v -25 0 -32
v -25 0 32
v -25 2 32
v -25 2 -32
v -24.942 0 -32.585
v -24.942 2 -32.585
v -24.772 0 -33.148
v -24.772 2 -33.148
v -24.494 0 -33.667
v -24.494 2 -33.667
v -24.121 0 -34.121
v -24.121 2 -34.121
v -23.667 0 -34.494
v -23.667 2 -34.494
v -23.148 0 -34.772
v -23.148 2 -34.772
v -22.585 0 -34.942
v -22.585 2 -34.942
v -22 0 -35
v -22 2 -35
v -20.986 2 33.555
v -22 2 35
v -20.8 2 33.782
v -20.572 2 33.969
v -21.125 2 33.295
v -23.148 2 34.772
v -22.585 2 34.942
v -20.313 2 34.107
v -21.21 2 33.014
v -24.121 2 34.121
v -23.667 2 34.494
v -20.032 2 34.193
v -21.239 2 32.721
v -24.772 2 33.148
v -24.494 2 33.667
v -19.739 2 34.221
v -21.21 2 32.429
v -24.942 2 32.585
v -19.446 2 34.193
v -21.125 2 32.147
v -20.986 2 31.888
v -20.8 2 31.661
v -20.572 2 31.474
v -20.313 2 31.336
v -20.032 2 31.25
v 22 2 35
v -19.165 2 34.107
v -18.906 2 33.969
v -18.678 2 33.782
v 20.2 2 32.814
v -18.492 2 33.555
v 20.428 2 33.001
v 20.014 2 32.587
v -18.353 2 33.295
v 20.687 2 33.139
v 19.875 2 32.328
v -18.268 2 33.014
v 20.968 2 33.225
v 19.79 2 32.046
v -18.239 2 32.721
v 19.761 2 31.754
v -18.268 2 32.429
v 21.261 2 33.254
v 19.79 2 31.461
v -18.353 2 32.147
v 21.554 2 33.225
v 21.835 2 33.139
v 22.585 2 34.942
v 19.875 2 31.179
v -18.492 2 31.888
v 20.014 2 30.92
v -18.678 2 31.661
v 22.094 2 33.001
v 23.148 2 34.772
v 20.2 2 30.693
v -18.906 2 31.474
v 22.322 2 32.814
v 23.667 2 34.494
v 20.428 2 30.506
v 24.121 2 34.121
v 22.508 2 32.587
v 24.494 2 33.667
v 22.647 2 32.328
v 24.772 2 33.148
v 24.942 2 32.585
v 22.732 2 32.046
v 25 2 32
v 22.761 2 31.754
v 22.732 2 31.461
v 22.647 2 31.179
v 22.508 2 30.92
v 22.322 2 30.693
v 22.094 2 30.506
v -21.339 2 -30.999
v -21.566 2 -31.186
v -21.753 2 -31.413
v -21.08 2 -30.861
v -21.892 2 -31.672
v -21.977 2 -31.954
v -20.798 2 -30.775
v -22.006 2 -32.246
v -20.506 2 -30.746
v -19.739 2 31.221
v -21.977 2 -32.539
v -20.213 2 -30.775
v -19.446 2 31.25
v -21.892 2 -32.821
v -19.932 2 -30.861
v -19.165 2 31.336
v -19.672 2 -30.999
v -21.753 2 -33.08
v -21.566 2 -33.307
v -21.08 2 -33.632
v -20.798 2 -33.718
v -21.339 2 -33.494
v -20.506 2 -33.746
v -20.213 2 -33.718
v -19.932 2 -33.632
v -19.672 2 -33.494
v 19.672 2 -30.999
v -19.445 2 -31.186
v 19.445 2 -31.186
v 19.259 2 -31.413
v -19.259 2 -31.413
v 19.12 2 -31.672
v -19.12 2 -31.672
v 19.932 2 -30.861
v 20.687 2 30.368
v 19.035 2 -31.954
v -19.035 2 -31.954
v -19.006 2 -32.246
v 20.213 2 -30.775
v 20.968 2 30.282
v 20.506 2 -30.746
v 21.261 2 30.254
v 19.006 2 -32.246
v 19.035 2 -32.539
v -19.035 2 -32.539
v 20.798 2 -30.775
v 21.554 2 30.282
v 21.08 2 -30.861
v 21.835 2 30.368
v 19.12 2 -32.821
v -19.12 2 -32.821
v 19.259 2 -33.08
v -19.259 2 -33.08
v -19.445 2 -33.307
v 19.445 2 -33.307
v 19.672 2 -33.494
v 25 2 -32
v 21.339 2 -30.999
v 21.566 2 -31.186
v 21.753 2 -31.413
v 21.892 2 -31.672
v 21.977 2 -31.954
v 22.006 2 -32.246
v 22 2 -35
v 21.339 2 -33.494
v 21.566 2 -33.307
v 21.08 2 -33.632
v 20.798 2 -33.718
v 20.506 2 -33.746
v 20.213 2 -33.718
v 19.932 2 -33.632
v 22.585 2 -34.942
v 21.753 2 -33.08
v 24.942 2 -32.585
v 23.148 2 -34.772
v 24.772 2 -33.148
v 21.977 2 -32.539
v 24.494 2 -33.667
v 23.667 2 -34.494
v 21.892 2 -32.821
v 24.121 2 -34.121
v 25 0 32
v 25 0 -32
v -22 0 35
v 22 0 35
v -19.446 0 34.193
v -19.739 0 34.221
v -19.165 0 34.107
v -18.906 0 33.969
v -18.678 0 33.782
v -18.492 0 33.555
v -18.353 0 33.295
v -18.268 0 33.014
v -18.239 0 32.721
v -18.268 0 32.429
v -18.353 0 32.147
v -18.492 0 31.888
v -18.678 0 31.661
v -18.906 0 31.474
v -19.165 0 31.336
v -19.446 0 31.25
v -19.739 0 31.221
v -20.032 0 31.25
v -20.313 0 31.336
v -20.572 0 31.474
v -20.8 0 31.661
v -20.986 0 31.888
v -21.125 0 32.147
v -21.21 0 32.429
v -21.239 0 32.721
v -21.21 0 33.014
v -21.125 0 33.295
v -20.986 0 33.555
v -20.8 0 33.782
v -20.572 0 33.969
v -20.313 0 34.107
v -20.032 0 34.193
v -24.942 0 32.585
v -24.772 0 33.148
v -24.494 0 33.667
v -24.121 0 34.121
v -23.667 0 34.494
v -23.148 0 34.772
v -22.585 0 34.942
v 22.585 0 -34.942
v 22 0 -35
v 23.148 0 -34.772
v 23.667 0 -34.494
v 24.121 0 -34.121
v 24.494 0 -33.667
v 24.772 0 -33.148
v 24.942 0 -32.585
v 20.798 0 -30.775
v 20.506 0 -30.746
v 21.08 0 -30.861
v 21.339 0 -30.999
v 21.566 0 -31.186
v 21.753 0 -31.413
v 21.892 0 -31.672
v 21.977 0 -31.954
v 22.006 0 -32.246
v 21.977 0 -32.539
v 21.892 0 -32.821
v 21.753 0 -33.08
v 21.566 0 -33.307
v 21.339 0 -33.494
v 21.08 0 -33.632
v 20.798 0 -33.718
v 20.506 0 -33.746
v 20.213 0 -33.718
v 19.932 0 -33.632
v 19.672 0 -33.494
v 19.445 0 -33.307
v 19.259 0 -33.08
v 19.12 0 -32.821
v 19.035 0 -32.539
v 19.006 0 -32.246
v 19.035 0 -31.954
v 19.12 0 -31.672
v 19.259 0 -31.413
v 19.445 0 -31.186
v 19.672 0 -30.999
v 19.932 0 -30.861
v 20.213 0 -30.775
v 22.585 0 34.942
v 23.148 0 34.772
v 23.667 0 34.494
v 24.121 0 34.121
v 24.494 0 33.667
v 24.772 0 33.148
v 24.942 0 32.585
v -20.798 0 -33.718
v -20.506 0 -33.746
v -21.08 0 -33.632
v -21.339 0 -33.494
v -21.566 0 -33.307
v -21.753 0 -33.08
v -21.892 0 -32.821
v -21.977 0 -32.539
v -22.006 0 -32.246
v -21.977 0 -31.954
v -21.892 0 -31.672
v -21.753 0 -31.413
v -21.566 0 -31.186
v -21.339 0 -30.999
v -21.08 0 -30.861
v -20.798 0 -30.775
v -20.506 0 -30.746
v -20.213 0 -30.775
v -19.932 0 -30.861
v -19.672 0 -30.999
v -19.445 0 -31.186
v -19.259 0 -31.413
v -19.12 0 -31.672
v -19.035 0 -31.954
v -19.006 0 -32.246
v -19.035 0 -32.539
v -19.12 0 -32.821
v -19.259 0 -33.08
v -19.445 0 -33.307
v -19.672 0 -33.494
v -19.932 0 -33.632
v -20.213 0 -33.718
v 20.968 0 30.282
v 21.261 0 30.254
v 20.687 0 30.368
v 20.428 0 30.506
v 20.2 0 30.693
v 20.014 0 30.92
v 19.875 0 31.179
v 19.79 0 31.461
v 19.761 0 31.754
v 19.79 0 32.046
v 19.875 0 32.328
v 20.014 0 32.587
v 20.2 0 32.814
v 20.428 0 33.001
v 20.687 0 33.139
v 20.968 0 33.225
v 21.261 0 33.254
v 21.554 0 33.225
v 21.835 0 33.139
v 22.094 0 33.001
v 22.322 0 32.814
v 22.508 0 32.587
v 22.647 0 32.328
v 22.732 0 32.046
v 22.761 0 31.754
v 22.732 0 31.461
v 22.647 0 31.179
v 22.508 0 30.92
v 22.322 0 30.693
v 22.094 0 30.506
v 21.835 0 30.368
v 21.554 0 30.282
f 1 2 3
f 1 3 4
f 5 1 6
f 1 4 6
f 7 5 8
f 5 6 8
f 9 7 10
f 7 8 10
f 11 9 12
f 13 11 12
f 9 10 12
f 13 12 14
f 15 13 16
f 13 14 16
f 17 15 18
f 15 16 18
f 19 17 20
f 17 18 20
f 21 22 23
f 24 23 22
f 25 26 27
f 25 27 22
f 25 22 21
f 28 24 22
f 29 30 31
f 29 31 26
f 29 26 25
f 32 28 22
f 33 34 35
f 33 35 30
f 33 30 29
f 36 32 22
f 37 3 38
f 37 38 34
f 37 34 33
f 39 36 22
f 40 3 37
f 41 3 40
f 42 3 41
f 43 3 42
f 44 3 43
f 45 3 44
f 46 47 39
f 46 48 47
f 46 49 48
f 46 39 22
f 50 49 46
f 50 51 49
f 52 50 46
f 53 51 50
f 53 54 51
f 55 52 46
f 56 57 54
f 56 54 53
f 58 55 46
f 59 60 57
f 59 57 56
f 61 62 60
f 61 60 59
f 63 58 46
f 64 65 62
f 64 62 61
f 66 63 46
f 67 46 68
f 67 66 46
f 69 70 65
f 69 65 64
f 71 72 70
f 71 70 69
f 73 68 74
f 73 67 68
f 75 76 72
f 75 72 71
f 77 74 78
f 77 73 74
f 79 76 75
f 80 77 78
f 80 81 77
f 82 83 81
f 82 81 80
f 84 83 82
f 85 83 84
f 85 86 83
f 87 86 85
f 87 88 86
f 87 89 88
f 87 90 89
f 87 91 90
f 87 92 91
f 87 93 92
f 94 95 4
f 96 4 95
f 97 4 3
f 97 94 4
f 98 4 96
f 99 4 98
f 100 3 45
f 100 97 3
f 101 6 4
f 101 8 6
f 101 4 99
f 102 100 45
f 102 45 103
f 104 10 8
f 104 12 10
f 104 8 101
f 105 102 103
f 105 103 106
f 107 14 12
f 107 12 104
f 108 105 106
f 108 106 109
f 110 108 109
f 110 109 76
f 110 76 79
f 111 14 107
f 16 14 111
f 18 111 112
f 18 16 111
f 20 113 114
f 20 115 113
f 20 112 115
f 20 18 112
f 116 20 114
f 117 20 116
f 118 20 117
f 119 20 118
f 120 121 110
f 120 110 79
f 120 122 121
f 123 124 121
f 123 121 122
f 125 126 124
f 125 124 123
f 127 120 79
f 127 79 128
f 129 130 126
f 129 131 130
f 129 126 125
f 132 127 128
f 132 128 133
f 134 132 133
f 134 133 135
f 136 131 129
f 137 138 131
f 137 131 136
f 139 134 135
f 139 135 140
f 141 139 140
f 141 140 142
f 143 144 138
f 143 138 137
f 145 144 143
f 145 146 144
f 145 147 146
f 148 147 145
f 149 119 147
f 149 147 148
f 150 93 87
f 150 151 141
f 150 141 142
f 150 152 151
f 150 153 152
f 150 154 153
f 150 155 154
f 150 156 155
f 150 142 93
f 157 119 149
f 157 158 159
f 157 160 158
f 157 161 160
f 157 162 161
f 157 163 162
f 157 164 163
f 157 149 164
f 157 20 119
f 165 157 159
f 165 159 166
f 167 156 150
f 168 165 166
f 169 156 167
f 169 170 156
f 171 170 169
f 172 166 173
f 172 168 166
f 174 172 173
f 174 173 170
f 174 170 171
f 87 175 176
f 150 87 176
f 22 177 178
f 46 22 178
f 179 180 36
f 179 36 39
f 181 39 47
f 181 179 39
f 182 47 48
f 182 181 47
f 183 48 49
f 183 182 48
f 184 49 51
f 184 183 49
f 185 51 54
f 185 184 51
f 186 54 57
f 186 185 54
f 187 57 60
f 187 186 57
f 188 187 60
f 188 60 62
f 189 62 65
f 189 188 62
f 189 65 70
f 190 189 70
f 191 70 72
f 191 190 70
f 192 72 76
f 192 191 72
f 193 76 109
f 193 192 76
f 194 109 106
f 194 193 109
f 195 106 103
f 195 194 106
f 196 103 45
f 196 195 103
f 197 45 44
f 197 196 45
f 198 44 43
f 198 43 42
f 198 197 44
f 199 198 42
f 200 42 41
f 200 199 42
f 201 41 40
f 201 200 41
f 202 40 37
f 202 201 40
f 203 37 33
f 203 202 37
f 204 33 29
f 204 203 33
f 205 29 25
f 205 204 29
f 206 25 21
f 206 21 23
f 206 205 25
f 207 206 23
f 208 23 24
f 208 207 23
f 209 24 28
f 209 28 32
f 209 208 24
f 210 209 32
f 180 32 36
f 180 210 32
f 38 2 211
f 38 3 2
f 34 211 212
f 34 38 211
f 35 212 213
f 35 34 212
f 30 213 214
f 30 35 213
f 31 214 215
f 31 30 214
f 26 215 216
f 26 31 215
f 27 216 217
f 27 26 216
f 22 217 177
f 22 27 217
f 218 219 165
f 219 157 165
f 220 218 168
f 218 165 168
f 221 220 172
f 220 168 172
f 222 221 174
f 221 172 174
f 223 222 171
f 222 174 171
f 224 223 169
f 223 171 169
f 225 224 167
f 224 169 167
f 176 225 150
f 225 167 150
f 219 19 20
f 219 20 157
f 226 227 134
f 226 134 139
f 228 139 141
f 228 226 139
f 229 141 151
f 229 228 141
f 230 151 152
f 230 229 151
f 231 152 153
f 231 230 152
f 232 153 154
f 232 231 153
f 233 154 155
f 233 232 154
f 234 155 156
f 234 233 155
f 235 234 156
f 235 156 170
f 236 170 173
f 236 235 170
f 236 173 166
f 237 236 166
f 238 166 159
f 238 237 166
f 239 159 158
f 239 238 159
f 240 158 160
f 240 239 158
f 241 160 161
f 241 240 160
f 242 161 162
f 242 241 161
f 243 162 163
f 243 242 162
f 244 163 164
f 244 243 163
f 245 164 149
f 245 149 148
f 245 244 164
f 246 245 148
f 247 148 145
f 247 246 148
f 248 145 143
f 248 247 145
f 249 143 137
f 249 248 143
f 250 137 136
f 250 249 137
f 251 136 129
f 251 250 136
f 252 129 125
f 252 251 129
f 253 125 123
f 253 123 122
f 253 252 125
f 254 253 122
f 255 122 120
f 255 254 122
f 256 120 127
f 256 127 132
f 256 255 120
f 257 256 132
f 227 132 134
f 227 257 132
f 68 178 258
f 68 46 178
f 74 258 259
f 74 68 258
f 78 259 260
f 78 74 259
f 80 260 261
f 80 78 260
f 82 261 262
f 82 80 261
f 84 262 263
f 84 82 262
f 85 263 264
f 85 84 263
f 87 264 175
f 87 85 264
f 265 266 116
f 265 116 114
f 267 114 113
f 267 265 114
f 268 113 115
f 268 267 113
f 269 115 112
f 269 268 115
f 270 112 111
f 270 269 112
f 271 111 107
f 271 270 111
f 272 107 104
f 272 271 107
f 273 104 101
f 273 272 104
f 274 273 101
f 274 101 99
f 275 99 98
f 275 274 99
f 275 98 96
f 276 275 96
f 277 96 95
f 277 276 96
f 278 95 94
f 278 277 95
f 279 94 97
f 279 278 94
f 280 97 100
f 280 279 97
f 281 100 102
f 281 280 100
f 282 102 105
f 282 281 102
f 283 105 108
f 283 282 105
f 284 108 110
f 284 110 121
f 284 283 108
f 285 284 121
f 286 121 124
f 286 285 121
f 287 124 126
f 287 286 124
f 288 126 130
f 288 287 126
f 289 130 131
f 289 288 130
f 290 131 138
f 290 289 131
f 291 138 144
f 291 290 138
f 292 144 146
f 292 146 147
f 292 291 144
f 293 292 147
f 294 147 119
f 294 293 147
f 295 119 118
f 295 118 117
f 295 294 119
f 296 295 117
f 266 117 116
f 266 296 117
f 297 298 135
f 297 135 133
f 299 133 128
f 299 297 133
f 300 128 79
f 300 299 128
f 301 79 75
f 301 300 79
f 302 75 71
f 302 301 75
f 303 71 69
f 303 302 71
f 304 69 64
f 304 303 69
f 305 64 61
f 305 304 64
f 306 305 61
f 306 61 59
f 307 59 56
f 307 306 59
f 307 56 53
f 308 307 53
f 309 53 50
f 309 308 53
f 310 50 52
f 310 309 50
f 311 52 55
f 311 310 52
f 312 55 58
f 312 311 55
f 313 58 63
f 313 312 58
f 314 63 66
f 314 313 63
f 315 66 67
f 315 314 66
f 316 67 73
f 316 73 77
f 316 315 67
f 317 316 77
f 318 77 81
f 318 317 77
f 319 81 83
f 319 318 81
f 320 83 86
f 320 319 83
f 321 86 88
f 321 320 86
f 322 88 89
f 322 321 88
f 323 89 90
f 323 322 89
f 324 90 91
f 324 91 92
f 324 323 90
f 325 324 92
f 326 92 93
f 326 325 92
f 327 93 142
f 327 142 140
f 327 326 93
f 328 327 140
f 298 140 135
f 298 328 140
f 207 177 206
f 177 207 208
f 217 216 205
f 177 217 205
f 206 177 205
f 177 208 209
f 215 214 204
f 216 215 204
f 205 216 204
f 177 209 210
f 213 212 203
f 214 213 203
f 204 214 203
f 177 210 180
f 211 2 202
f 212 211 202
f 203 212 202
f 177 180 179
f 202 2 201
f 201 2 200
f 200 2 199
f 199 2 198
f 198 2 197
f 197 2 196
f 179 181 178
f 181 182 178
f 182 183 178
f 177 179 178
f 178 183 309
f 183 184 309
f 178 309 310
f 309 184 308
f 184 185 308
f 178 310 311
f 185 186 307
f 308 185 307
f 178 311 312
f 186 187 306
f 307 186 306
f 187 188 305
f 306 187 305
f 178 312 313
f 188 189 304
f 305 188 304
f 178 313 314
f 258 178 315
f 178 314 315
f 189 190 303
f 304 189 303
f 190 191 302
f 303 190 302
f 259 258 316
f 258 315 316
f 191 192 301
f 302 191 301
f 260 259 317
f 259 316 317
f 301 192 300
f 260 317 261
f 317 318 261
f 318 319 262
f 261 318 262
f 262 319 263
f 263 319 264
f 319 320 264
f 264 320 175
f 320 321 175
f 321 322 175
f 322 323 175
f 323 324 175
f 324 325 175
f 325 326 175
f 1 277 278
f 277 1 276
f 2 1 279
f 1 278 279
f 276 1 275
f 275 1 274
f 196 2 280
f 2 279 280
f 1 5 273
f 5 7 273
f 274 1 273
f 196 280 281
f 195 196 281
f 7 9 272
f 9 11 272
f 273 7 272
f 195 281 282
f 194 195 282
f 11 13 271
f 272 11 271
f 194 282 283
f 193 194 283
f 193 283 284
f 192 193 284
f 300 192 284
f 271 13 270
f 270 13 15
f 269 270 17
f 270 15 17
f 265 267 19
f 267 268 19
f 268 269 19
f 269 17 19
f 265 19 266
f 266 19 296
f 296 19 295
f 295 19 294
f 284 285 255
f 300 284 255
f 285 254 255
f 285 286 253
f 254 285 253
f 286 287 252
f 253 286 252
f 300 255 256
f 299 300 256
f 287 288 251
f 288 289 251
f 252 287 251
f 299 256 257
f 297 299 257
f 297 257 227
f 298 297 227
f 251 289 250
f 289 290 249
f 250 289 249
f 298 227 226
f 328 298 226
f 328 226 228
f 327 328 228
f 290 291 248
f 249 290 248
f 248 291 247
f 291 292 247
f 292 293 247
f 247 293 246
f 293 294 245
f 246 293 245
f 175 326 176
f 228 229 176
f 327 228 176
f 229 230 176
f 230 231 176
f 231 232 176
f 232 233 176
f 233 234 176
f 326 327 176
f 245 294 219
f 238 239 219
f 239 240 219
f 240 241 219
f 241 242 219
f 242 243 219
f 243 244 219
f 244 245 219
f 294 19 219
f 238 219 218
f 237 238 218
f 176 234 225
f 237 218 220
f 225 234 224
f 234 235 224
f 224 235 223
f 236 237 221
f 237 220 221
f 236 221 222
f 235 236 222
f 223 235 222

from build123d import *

# Parameters (mm, degrees)
SKETCH_1_W      = 50
SKETCH_1_H      = 70
SKETCH_1_R      = 1.5
EXTRUDE_1_DEPTH = 2
FILLET_1_R      = 3


with BuildPart() as part:
    # 草图1 → 凸台-拉伸1 (new body)
    with BuildSketch(Plane(origin=(0, 0, 0), x_dir=(1, 0, 0), z_dir=(0, 1, 0))):
        Rectangle(SKETCH_1_W, SKETCH_1_H)
        with Locations(Location((20.505712162, 32.246478585, 0), (0, 0, 270))):
            Circle(SKETCH_1_R, mode=Mode.SUBTRACT)
        with Locations(Location((-20.505712162, 32.246478585, 0), (0, 0, 90))):
            Circle(SKETCH_1_R, mode=Mode.SUBTRACT)
        with Locations(Location((21.261079234, -31.753521415, 0), (0, 0, 90))):
            Circle(SKETCH_1_R, mode=Mode.SUBTRACT)
        with Locations(Location((-19.738920766, -32.721470313, 0), (0, 0, 270))):
            Circle(SKETCH_1_R, mode=Mode.SUBTRACT)
    extrude(amount=EXTRUDE_1_DEPTH)

    # 圆角1
    fillet_1_edges = [part.edges().sort_by_distance(p)[0] for p in [
        (25, 1, 35),
        (-25, 1, 35),
        (-25, 1, -35),
        (25, 1, -35),
    ]]
    fillet(fillet_1_edges, radius=FILLET_1_R)


solid = part.part
